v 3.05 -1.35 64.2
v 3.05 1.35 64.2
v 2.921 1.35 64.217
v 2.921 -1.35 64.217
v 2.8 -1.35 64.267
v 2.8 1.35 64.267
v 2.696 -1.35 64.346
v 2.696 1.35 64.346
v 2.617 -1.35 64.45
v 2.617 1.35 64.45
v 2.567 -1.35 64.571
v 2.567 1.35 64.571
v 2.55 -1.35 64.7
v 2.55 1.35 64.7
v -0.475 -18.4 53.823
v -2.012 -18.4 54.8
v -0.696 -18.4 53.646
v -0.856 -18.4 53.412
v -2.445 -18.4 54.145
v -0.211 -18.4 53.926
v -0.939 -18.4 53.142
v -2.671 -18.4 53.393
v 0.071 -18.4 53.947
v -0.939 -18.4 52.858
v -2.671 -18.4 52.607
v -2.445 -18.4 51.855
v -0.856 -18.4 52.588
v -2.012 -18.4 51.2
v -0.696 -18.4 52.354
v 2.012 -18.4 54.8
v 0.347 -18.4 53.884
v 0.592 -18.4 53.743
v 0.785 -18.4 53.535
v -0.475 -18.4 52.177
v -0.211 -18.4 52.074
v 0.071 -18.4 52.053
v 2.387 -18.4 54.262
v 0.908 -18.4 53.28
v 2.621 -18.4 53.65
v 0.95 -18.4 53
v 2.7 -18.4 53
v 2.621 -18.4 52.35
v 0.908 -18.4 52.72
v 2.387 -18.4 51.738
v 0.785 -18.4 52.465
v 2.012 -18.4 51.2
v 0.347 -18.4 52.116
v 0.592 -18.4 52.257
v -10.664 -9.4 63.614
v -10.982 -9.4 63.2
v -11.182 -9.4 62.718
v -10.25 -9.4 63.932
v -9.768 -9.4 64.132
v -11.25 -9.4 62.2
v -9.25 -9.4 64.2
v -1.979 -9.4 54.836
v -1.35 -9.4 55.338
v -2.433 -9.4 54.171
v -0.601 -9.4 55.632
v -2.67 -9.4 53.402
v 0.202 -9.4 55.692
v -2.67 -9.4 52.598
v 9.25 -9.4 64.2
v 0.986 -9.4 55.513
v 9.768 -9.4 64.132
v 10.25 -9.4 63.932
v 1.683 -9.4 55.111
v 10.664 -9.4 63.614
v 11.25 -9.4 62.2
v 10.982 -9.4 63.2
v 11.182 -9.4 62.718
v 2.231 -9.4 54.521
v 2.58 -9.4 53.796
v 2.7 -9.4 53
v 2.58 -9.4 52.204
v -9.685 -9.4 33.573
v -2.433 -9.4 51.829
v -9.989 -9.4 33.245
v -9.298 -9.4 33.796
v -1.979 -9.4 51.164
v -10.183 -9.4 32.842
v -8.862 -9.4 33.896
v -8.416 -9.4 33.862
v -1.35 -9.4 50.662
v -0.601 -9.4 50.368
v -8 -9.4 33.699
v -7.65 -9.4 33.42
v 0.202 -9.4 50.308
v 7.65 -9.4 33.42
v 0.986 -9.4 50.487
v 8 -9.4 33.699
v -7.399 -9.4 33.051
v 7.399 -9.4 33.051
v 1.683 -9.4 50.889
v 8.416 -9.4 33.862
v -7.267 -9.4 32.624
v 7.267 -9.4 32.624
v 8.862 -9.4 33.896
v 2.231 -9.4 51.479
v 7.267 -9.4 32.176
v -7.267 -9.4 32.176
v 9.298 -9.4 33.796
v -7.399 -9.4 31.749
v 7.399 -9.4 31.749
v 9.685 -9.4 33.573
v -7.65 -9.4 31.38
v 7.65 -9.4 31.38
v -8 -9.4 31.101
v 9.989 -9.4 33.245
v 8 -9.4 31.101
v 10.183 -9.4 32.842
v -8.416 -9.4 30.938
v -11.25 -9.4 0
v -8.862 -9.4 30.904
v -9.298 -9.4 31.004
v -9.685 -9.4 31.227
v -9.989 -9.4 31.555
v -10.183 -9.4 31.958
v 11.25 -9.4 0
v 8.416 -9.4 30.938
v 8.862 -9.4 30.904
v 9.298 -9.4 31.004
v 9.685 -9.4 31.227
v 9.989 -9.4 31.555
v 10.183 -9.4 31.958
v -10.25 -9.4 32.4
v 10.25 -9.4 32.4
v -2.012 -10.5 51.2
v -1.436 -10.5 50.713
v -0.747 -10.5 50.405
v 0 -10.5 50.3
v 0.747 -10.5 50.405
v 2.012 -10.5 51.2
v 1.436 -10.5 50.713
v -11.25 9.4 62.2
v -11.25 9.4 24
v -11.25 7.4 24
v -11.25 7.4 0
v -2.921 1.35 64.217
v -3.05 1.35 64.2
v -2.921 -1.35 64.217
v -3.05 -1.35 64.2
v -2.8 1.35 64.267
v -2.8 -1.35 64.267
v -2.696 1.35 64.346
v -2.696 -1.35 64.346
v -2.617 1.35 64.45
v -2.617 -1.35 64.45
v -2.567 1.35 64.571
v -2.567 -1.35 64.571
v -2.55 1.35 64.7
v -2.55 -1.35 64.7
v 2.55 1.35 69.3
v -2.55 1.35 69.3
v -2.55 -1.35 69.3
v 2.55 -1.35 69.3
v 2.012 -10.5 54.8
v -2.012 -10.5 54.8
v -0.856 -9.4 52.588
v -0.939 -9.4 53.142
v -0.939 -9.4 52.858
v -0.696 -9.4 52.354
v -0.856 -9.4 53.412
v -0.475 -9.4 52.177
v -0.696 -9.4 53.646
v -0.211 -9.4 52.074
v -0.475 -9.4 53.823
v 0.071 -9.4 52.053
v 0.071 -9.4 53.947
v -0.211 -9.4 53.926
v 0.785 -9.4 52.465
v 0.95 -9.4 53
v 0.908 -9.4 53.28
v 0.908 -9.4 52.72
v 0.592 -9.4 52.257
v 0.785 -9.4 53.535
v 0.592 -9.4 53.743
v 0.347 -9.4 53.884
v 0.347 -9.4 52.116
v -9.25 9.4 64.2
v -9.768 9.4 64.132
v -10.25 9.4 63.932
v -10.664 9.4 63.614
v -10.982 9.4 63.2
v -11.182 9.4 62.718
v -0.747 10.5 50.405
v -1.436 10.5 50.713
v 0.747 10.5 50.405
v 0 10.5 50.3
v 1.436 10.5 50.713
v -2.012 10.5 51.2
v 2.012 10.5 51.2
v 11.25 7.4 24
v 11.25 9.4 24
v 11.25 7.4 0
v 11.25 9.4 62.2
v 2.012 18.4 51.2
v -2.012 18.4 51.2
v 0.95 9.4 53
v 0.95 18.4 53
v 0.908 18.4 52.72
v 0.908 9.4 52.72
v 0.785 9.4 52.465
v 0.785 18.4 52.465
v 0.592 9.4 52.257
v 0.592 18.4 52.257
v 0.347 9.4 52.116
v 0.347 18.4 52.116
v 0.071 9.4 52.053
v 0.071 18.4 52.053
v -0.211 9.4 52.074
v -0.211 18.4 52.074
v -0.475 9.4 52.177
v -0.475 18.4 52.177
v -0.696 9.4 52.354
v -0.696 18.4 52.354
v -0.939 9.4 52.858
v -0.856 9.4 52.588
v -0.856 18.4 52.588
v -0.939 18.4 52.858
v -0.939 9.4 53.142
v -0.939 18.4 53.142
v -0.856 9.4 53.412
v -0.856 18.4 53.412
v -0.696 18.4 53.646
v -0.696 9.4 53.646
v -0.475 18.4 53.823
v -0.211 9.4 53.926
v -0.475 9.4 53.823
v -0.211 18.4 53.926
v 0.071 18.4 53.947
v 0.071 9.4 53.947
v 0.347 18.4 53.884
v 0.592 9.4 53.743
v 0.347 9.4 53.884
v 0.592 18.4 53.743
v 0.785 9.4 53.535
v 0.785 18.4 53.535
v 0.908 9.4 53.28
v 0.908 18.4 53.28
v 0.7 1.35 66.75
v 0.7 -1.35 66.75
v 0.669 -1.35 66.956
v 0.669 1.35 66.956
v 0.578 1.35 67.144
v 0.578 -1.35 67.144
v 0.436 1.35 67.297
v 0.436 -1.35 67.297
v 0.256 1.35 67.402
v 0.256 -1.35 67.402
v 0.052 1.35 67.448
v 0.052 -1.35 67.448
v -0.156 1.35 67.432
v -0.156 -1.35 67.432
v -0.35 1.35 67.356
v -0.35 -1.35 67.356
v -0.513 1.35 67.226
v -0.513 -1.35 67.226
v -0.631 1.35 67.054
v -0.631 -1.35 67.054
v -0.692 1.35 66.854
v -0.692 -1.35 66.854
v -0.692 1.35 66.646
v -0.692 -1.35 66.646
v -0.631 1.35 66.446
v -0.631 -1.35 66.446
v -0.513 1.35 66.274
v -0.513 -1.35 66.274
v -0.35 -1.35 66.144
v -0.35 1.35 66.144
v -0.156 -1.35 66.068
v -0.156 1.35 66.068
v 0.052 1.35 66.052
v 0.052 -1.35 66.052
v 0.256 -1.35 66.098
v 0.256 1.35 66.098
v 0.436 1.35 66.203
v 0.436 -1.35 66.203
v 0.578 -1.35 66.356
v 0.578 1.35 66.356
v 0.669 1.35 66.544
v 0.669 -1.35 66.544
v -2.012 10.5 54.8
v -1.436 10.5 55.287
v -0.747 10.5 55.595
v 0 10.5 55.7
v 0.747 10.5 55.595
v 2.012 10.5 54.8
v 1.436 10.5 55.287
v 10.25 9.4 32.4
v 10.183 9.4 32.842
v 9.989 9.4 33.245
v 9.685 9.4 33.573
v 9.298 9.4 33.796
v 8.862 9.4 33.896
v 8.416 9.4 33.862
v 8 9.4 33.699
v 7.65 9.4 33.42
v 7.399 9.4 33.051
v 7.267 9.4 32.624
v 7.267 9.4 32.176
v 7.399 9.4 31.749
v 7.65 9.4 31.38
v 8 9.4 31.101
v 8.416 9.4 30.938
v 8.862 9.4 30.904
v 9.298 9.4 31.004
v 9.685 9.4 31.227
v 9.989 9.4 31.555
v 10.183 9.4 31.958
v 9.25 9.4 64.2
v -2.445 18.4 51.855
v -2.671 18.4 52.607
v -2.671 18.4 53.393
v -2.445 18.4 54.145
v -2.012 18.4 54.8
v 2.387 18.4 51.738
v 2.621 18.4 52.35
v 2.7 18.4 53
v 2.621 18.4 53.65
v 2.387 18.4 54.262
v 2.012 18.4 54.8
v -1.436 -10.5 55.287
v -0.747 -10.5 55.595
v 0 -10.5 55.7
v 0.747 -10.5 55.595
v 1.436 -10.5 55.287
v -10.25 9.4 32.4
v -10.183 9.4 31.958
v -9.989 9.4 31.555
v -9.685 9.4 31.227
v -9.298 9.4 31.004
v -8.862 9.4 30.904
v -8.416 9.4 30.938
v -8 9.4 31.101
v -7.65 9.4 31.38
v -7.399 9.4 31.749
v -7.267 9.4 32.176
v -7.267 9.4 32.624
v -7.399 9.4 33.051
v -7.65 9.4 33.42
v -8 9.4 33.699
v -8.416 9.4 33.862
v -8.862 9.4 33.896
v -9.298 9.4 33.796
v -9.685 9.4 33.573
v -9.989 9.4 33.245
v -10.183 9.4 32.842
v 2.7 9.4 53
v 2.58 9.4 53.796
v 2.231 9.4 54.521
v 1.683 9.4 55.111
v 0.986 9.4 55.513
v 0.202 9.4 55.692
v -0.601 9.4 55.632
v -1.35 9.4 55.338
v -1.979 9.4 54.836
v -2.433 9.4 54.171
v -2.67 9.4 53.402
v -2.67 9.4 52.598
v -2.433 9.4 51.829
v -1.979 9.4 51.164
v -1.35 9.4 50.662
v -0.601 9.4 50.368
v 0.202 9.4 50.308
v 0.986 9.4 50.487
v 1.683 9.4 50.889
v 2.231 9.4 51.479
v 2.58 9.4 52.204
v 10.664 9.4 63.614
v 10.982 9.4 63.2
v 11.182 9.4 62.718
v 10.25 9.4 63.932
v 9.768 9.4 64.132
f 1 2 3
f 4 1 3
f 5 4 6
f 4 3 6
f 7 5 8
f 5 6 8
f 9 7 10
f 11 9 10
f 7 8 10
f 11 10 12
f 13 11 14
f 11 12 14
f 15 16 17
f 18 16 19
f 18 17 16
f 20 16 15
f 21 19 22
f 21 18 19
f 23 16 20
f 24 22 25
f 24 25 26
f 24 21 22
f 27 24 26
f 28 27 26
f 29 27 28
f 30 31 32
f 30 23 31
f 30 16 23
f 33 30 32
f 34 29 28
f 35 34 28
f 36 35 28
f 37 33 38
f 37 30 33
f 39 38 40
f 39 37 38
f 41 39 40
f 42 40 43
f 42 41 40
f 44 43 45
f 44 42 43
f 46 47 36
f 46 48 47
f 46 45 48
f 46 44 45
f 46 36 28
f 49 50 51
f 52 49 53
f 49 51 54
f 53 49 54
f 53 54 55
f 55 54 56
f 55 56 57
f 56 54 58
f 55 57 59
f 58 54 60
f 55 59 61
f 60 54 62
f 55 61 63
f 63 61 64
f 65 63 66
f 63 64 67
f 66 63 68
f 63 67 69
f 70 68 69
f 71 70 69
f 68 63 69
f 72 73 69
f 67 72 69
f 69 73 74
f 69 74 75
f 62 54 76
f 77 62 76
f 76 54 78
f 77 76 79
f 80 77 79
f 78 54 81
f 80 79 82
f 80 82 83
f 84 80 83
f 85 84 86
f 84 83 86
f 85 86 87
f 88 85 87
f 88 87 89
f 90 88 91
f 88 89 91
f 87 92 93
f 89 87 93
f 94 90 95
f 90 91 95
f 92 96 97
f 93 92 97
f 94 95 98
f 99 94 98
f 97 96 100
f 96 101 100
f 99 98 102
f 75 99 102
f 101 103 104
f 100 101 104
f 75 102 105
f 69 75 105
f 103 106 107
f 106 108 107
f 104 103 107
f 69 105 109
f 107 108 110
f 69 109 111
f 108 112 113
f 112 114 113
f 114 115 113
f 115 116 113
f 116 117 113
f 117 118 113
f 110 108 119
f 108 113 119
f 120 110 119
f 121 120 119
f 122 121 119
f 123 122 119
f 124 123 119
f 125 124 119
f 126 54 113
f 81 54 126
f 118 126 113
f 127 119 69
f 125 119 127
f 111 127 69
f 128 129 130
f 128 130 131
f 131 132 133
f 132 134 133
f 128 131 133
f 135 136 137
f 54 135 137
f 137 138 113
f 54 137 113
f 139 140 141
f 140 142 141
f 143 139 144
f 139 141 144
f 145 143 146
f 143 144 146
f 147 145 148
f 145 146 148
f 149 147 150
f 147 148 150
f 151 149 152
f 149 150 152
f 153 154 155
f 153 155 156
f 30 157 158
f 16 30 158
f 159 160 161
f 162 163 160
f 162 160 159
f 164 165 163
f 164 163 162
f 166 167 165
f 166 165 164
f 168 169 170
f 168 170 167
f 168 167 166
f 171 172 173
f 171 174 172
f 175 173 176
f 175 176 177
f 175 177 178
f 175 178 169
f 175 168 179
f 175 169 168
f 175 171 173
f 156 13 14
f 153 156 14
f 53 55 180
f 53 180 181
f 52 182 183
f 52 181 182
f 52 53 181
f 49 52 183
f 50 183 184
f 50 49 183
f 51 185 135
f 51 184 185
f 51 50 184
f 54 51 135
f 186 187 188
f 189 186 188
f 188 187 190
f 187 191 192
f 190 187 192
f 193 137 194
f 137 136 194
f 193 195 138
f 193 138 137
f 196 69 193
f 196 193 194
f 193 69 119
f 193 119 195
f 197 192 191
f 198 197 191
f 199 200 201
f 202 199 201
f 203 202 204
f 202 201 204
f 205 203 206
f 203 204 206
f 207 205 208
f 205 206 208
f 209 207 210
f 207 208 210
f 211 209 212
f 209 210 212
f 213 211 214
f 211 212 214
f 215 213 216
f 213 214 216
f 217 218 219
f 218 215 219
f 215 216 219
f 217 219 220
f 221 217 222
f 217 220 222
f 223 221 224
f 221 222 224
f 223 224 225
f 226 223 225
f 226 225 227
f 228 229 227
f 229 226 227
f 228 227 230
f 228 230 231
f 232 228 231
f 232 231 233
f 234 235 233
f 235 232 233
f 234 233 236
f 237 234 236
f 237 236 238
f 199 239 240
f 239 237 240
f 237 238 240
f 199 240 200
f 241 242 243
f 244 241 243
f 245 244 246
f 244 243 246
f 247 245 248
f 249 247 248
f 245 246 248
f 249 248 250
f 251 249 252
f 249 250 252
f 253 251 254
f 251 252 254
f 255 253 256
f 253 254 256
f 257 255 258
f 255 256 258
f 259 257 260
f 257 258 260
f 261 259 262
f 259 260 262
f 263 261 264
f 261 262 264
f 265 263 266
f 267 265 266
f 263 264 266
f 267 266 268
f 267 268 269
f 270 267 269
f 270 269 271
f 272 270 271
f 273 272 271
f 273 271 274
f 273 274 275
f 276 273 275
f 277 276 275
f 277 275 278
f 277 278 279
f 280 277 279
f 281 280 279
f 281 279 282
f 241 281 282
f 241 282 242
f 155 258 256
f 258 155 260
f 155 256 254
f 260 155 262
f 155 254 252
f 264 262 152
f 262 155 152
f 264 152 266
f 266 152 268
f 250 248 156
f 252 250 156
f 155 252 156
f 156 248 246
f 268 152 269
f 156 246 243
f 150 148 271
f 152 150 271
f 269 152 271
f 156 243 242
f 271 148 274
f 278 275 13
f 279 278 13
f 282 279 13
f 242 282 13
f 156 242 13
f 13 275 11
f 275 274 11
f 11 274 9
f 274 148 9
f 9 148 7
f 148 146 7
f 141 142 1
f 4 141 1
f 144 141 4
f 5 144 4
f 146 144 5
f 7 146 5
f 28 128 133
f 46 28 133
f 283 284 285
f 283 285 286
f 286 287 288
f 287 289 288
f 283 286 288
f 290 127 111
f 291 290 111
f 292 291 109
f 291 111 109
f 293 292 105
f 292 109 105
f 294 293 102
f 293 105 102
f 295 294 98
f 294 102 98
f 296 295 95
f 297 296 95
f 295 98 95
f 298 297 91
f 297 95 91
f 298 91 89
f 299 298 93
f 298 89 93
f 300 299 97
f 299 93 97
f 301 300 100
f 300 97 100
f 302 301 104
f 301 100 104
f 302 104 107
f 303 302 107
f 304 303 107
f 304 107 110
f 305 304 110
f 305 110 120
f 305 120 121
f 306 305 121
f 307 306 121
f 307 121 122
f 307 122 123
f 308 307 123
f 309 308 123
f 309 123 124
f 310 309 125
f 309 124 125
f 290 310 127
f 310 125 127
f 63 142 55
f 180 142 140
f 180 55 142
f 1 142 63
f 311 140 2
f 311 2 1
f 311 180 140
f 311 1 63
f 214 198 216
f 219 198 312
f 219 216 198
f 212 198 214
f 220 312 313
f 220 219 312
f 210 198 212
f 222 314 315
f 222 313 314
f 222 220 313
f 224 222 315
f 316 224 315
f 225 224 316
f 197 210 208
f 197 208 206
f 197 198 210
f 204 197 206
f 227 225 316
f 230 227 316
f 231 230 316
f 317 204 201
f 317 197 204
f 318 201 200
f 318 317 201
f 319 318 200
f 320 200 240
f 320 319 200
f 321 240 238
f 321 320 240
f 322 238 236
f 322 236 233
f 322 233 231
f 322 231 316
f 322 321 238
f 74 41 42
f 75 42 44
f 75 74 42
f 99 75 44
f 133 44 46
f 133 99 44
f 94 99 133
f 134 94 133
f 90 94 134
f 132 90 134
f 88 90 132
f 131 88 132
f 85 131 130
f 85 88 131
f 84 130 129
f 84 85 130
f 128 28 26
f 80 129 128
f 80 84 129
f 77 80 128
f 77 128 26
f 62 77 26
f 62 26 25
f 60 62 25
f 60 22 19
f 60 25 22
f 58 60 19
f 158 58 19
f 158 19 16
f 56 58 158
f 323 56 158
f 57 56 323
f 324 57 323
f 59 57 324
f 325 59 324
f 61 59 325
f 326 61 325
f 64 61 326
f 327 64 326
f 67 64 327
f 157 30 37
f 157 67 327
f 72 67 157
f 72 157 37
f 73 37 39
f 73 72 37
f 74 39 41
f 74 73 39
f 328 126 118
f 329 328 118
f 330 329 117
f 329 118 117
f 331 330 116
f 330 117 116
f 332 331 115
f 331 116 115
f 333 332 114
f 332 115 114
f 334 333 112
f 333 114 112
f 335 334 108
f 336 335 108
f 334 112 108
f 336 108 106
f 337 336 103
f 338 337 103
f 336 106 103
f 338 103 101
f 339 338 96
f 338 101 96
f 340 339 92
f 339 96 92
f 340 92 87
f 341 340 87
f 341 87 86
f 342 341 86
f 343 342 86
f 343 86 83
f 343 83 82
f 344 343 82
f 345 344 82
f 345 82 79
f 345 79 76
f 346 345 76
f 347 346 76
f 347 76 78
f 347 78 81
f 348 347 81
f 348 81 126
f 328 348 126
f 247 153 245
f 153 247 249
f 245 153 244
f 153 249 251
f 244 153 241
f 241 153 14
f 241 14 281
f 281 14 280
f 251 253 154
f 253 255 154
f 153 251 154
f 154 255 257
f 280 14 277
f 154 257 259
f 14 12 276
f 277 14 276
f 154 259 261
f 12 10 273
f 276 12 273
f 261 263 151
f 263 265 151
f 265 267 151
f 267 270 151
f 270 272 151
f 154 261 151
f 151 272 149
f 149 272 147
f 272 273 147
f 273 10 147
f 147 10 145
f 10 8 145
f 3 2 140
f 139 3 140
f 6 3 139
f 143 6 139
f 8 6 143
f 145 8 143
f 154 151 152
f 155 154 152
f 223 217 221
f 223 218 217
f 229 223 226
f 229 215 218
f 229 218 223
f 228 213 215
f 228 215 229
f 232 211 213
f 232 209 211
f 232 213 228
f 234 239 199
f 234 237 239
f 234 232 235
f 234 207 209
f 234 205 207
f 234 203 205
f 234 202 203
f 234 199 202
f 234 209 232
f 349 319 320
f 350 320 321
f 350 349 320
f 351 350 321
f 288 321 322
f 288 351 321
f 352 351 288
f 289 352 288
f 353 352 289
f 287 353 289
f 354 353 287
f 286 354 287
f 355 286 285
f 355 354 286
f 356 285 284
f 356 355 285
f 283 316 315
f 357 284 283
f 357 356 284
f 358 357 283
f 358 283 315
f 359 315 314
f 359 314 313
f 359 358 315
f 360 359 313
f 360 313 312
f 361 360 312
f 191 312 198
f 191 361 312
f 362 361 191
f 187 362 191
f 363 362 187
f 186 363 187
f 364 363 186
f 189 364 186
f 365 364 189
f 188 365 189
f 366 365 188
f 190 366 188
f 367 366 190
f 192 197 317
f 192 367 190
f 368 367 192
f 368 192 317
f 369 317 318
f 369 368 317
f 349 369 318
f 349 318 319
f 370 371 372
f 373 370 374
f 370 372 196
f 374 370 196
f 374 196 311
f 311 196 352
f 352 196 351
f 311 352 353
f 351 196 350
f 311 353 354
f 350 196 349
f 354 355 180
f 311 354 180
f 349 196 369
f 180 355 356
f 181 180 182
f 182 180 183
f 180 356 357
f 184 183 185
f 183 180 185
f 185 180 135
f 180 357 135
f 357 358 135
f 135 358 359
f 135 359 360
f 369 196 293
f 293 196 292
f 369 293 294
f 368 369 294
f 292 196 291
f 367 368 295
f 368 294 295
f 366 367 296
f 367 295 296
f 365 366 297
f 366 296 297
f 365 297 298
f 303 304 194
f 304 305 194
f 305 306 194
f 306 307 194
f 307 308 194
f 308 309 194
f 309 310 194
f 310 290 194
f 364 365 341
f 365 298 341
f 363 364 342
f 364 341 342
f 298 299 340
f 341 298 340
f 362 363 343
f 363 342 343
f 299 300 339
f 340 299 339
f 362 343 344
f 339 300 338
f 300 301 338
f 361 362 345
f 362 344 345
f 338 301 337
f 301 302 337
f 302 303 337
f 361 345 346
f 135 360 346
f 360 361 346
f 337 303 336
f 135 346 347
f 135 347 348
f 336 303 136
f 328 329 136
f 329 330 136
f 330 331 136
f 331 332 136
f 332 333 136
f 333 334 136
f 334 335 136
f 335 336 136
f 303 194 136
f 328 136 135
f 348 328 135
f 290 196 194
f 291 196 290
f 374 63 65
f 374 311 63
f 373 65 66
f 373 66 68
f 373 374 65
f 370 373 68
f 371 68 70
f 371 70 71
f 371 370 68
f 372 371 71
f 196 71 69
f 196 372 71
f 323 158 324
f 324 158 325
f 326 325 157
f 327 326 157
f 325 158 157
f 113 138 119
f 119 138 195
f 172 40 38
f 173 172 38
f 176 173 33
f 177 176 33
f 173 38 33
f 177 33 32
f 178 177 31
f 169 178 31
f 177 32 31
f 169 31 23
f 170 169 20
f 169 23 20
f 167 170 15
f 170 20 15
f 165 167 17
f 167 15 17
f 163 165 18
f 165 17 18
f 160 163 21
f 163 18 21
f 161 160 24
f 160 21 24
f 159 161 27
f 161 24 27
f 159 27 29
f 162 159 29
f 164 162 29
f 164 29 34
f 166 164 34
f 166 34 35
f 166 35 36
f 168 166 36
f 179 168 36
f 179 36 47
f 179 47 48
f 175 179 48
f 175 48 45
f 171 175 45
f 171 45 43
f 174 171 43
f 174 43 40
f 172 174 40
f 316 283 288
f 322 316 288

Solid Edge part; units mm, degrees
sketch "Sketch1" plane through (0, 0, 0) normal (0, 0, 1) x (1, 0, 0)
  line L0 (-11.25, -9.4) -> (11.25, -9.4)
  line L1 (11.25, -9.4) -> (11.25, 9.4)
  line L2 (11.25, 9.4) -> (-11.25, 9.4)
  line L3 (-11.25, 9.4) -> (-11.25, -9.4)
  dimension "D1" = 22.5
  dimension "D2" = 18.8
extrude "Ajout_matière_1" add sketch "Sketch1" along normal blind 64.2
sketch "Sketch2" plane through (0, -9.4, 32.1) normal (0, -1, 0) x (1, 0, 0)
  circle A0 centre (0, 20.9) radius 2.7
  dimension "D1" = 5.4
  dimension "D2" = 11.2
extrude "Ajout_matière_2" add sketch "Sketch2" along normal blind 9
sketch "Sketch3" plane through (0, -18.4, 53) normal (0, -1, 0) x (1, 0, 0)
  circle A0 centre (0, 0) radius 0.95
  dimension "D1" = 1.9
extrude "Cutout1" cut sketch "Sketch3" against normal up to vertex (9 mm away)
sketch "Sketch4" plane through (0, -18.4, 53) normal (0, -1, 0) x (1, 0, 0)
  line L0 (2.0125, 1.8) -> (-2.0125, 1.8)
  arc A0 (-2.0125, 1.8) -> (2.0125, 1.8) centre (0, 0) cw
  line L1 (-2.0125, -1.8) -> (2.0125, -1.8)
  arc A1 (-2.0125, -1.8) -> (2.0125, -1.8) centre (0, 0) ccw
  dimension "D1" = 0.9
  dimension "D2" = 4.0249
  dimension "D3" = 2.7
  dimension "D4" = 0.9
  dimension "D5" = 4.0249
  dimension "D6" = 2.7
extrude "Enlèvement_matière_2" cut sketch "Sketch4" against normal blind 7.9
sketch "Sketch5" plane through (0, 0, 64.2) normal (0, 0, 1) x (0, 1, 0)
  line L0 (-1.35, -2.55) -> (1.35, -2.55)
  line L1 (1.35, -2.55) -> (1.35, 2.55)
  line L2 (1.35, 2.55) -> (-1.35, 2.55)
  line L3 (-1.35, 2.55) -> (-1.35, -2.55)
  dimension "D1" = 5.1
  dimension "D2" = 2.7
extrude "Ajout_matière_3" add sketch "Sketch5" along normal blind 5.1
sketch "Sketch6" plane through (0, -1.35, 65.4) normal (0, -1, 0) x (1, 0, 0)
  circle A0 centre (0, 1.35) radius 0.7
  dimension "D1" = 1.4
extrude "Cutout2" cut sketch "Sketch6" against normal through all
sketch "Sketch7" plane through (0, -9.4, 32.1) normal (0, -1, 0) x (1, 0, 0)
  circle A0 centre (8.75, 0.3) radius 1.5
  dimension "D1" = 3
  dimension "D2" = 31.8
  dimension "D3" = 8.75
extrude "Cutout3" cut sketch "Sketch7" against normal through all
mirror "Mirror1" about plane through (0, 0, 0) normal (1, 0, 0) of "Cutout3"
mirror "Mirror2" about plane through (0, 0, 0) normal (0, -1, 0) of "Ajout_matière_2", "Cutout1", "Enlèvement_matière_2"
fillet "Congé_1" radius 2 2 edges at (11.25, 0, 64.2) (-11.25, 0, 64.2)
fillet "Congé_2" radius 0.5 2 edges at (-2.55, 0, 64.2) (2.55, 0, 64.2)
sketch "Sketch8" plane through (0, 9.4, 32.1) normal (0, 1, 0) x (-1, 0, 0)
  line L0 (-11.25, -32.1) -> (11.25, -32.1)
  line L1 (11.25, -32.1) -> (11.25, -8.1)
  line L2 (11.25, -8.1) -> (-11.25, -8.1)
  line L3 (-11.25, -8.1) -> (-11.25, -32.1)
  dimension "D1" = 24
extrude "Enlèvement_matière_8" cut sketch "Sketch8" against normal blind 2
properties material "Acier S235"
